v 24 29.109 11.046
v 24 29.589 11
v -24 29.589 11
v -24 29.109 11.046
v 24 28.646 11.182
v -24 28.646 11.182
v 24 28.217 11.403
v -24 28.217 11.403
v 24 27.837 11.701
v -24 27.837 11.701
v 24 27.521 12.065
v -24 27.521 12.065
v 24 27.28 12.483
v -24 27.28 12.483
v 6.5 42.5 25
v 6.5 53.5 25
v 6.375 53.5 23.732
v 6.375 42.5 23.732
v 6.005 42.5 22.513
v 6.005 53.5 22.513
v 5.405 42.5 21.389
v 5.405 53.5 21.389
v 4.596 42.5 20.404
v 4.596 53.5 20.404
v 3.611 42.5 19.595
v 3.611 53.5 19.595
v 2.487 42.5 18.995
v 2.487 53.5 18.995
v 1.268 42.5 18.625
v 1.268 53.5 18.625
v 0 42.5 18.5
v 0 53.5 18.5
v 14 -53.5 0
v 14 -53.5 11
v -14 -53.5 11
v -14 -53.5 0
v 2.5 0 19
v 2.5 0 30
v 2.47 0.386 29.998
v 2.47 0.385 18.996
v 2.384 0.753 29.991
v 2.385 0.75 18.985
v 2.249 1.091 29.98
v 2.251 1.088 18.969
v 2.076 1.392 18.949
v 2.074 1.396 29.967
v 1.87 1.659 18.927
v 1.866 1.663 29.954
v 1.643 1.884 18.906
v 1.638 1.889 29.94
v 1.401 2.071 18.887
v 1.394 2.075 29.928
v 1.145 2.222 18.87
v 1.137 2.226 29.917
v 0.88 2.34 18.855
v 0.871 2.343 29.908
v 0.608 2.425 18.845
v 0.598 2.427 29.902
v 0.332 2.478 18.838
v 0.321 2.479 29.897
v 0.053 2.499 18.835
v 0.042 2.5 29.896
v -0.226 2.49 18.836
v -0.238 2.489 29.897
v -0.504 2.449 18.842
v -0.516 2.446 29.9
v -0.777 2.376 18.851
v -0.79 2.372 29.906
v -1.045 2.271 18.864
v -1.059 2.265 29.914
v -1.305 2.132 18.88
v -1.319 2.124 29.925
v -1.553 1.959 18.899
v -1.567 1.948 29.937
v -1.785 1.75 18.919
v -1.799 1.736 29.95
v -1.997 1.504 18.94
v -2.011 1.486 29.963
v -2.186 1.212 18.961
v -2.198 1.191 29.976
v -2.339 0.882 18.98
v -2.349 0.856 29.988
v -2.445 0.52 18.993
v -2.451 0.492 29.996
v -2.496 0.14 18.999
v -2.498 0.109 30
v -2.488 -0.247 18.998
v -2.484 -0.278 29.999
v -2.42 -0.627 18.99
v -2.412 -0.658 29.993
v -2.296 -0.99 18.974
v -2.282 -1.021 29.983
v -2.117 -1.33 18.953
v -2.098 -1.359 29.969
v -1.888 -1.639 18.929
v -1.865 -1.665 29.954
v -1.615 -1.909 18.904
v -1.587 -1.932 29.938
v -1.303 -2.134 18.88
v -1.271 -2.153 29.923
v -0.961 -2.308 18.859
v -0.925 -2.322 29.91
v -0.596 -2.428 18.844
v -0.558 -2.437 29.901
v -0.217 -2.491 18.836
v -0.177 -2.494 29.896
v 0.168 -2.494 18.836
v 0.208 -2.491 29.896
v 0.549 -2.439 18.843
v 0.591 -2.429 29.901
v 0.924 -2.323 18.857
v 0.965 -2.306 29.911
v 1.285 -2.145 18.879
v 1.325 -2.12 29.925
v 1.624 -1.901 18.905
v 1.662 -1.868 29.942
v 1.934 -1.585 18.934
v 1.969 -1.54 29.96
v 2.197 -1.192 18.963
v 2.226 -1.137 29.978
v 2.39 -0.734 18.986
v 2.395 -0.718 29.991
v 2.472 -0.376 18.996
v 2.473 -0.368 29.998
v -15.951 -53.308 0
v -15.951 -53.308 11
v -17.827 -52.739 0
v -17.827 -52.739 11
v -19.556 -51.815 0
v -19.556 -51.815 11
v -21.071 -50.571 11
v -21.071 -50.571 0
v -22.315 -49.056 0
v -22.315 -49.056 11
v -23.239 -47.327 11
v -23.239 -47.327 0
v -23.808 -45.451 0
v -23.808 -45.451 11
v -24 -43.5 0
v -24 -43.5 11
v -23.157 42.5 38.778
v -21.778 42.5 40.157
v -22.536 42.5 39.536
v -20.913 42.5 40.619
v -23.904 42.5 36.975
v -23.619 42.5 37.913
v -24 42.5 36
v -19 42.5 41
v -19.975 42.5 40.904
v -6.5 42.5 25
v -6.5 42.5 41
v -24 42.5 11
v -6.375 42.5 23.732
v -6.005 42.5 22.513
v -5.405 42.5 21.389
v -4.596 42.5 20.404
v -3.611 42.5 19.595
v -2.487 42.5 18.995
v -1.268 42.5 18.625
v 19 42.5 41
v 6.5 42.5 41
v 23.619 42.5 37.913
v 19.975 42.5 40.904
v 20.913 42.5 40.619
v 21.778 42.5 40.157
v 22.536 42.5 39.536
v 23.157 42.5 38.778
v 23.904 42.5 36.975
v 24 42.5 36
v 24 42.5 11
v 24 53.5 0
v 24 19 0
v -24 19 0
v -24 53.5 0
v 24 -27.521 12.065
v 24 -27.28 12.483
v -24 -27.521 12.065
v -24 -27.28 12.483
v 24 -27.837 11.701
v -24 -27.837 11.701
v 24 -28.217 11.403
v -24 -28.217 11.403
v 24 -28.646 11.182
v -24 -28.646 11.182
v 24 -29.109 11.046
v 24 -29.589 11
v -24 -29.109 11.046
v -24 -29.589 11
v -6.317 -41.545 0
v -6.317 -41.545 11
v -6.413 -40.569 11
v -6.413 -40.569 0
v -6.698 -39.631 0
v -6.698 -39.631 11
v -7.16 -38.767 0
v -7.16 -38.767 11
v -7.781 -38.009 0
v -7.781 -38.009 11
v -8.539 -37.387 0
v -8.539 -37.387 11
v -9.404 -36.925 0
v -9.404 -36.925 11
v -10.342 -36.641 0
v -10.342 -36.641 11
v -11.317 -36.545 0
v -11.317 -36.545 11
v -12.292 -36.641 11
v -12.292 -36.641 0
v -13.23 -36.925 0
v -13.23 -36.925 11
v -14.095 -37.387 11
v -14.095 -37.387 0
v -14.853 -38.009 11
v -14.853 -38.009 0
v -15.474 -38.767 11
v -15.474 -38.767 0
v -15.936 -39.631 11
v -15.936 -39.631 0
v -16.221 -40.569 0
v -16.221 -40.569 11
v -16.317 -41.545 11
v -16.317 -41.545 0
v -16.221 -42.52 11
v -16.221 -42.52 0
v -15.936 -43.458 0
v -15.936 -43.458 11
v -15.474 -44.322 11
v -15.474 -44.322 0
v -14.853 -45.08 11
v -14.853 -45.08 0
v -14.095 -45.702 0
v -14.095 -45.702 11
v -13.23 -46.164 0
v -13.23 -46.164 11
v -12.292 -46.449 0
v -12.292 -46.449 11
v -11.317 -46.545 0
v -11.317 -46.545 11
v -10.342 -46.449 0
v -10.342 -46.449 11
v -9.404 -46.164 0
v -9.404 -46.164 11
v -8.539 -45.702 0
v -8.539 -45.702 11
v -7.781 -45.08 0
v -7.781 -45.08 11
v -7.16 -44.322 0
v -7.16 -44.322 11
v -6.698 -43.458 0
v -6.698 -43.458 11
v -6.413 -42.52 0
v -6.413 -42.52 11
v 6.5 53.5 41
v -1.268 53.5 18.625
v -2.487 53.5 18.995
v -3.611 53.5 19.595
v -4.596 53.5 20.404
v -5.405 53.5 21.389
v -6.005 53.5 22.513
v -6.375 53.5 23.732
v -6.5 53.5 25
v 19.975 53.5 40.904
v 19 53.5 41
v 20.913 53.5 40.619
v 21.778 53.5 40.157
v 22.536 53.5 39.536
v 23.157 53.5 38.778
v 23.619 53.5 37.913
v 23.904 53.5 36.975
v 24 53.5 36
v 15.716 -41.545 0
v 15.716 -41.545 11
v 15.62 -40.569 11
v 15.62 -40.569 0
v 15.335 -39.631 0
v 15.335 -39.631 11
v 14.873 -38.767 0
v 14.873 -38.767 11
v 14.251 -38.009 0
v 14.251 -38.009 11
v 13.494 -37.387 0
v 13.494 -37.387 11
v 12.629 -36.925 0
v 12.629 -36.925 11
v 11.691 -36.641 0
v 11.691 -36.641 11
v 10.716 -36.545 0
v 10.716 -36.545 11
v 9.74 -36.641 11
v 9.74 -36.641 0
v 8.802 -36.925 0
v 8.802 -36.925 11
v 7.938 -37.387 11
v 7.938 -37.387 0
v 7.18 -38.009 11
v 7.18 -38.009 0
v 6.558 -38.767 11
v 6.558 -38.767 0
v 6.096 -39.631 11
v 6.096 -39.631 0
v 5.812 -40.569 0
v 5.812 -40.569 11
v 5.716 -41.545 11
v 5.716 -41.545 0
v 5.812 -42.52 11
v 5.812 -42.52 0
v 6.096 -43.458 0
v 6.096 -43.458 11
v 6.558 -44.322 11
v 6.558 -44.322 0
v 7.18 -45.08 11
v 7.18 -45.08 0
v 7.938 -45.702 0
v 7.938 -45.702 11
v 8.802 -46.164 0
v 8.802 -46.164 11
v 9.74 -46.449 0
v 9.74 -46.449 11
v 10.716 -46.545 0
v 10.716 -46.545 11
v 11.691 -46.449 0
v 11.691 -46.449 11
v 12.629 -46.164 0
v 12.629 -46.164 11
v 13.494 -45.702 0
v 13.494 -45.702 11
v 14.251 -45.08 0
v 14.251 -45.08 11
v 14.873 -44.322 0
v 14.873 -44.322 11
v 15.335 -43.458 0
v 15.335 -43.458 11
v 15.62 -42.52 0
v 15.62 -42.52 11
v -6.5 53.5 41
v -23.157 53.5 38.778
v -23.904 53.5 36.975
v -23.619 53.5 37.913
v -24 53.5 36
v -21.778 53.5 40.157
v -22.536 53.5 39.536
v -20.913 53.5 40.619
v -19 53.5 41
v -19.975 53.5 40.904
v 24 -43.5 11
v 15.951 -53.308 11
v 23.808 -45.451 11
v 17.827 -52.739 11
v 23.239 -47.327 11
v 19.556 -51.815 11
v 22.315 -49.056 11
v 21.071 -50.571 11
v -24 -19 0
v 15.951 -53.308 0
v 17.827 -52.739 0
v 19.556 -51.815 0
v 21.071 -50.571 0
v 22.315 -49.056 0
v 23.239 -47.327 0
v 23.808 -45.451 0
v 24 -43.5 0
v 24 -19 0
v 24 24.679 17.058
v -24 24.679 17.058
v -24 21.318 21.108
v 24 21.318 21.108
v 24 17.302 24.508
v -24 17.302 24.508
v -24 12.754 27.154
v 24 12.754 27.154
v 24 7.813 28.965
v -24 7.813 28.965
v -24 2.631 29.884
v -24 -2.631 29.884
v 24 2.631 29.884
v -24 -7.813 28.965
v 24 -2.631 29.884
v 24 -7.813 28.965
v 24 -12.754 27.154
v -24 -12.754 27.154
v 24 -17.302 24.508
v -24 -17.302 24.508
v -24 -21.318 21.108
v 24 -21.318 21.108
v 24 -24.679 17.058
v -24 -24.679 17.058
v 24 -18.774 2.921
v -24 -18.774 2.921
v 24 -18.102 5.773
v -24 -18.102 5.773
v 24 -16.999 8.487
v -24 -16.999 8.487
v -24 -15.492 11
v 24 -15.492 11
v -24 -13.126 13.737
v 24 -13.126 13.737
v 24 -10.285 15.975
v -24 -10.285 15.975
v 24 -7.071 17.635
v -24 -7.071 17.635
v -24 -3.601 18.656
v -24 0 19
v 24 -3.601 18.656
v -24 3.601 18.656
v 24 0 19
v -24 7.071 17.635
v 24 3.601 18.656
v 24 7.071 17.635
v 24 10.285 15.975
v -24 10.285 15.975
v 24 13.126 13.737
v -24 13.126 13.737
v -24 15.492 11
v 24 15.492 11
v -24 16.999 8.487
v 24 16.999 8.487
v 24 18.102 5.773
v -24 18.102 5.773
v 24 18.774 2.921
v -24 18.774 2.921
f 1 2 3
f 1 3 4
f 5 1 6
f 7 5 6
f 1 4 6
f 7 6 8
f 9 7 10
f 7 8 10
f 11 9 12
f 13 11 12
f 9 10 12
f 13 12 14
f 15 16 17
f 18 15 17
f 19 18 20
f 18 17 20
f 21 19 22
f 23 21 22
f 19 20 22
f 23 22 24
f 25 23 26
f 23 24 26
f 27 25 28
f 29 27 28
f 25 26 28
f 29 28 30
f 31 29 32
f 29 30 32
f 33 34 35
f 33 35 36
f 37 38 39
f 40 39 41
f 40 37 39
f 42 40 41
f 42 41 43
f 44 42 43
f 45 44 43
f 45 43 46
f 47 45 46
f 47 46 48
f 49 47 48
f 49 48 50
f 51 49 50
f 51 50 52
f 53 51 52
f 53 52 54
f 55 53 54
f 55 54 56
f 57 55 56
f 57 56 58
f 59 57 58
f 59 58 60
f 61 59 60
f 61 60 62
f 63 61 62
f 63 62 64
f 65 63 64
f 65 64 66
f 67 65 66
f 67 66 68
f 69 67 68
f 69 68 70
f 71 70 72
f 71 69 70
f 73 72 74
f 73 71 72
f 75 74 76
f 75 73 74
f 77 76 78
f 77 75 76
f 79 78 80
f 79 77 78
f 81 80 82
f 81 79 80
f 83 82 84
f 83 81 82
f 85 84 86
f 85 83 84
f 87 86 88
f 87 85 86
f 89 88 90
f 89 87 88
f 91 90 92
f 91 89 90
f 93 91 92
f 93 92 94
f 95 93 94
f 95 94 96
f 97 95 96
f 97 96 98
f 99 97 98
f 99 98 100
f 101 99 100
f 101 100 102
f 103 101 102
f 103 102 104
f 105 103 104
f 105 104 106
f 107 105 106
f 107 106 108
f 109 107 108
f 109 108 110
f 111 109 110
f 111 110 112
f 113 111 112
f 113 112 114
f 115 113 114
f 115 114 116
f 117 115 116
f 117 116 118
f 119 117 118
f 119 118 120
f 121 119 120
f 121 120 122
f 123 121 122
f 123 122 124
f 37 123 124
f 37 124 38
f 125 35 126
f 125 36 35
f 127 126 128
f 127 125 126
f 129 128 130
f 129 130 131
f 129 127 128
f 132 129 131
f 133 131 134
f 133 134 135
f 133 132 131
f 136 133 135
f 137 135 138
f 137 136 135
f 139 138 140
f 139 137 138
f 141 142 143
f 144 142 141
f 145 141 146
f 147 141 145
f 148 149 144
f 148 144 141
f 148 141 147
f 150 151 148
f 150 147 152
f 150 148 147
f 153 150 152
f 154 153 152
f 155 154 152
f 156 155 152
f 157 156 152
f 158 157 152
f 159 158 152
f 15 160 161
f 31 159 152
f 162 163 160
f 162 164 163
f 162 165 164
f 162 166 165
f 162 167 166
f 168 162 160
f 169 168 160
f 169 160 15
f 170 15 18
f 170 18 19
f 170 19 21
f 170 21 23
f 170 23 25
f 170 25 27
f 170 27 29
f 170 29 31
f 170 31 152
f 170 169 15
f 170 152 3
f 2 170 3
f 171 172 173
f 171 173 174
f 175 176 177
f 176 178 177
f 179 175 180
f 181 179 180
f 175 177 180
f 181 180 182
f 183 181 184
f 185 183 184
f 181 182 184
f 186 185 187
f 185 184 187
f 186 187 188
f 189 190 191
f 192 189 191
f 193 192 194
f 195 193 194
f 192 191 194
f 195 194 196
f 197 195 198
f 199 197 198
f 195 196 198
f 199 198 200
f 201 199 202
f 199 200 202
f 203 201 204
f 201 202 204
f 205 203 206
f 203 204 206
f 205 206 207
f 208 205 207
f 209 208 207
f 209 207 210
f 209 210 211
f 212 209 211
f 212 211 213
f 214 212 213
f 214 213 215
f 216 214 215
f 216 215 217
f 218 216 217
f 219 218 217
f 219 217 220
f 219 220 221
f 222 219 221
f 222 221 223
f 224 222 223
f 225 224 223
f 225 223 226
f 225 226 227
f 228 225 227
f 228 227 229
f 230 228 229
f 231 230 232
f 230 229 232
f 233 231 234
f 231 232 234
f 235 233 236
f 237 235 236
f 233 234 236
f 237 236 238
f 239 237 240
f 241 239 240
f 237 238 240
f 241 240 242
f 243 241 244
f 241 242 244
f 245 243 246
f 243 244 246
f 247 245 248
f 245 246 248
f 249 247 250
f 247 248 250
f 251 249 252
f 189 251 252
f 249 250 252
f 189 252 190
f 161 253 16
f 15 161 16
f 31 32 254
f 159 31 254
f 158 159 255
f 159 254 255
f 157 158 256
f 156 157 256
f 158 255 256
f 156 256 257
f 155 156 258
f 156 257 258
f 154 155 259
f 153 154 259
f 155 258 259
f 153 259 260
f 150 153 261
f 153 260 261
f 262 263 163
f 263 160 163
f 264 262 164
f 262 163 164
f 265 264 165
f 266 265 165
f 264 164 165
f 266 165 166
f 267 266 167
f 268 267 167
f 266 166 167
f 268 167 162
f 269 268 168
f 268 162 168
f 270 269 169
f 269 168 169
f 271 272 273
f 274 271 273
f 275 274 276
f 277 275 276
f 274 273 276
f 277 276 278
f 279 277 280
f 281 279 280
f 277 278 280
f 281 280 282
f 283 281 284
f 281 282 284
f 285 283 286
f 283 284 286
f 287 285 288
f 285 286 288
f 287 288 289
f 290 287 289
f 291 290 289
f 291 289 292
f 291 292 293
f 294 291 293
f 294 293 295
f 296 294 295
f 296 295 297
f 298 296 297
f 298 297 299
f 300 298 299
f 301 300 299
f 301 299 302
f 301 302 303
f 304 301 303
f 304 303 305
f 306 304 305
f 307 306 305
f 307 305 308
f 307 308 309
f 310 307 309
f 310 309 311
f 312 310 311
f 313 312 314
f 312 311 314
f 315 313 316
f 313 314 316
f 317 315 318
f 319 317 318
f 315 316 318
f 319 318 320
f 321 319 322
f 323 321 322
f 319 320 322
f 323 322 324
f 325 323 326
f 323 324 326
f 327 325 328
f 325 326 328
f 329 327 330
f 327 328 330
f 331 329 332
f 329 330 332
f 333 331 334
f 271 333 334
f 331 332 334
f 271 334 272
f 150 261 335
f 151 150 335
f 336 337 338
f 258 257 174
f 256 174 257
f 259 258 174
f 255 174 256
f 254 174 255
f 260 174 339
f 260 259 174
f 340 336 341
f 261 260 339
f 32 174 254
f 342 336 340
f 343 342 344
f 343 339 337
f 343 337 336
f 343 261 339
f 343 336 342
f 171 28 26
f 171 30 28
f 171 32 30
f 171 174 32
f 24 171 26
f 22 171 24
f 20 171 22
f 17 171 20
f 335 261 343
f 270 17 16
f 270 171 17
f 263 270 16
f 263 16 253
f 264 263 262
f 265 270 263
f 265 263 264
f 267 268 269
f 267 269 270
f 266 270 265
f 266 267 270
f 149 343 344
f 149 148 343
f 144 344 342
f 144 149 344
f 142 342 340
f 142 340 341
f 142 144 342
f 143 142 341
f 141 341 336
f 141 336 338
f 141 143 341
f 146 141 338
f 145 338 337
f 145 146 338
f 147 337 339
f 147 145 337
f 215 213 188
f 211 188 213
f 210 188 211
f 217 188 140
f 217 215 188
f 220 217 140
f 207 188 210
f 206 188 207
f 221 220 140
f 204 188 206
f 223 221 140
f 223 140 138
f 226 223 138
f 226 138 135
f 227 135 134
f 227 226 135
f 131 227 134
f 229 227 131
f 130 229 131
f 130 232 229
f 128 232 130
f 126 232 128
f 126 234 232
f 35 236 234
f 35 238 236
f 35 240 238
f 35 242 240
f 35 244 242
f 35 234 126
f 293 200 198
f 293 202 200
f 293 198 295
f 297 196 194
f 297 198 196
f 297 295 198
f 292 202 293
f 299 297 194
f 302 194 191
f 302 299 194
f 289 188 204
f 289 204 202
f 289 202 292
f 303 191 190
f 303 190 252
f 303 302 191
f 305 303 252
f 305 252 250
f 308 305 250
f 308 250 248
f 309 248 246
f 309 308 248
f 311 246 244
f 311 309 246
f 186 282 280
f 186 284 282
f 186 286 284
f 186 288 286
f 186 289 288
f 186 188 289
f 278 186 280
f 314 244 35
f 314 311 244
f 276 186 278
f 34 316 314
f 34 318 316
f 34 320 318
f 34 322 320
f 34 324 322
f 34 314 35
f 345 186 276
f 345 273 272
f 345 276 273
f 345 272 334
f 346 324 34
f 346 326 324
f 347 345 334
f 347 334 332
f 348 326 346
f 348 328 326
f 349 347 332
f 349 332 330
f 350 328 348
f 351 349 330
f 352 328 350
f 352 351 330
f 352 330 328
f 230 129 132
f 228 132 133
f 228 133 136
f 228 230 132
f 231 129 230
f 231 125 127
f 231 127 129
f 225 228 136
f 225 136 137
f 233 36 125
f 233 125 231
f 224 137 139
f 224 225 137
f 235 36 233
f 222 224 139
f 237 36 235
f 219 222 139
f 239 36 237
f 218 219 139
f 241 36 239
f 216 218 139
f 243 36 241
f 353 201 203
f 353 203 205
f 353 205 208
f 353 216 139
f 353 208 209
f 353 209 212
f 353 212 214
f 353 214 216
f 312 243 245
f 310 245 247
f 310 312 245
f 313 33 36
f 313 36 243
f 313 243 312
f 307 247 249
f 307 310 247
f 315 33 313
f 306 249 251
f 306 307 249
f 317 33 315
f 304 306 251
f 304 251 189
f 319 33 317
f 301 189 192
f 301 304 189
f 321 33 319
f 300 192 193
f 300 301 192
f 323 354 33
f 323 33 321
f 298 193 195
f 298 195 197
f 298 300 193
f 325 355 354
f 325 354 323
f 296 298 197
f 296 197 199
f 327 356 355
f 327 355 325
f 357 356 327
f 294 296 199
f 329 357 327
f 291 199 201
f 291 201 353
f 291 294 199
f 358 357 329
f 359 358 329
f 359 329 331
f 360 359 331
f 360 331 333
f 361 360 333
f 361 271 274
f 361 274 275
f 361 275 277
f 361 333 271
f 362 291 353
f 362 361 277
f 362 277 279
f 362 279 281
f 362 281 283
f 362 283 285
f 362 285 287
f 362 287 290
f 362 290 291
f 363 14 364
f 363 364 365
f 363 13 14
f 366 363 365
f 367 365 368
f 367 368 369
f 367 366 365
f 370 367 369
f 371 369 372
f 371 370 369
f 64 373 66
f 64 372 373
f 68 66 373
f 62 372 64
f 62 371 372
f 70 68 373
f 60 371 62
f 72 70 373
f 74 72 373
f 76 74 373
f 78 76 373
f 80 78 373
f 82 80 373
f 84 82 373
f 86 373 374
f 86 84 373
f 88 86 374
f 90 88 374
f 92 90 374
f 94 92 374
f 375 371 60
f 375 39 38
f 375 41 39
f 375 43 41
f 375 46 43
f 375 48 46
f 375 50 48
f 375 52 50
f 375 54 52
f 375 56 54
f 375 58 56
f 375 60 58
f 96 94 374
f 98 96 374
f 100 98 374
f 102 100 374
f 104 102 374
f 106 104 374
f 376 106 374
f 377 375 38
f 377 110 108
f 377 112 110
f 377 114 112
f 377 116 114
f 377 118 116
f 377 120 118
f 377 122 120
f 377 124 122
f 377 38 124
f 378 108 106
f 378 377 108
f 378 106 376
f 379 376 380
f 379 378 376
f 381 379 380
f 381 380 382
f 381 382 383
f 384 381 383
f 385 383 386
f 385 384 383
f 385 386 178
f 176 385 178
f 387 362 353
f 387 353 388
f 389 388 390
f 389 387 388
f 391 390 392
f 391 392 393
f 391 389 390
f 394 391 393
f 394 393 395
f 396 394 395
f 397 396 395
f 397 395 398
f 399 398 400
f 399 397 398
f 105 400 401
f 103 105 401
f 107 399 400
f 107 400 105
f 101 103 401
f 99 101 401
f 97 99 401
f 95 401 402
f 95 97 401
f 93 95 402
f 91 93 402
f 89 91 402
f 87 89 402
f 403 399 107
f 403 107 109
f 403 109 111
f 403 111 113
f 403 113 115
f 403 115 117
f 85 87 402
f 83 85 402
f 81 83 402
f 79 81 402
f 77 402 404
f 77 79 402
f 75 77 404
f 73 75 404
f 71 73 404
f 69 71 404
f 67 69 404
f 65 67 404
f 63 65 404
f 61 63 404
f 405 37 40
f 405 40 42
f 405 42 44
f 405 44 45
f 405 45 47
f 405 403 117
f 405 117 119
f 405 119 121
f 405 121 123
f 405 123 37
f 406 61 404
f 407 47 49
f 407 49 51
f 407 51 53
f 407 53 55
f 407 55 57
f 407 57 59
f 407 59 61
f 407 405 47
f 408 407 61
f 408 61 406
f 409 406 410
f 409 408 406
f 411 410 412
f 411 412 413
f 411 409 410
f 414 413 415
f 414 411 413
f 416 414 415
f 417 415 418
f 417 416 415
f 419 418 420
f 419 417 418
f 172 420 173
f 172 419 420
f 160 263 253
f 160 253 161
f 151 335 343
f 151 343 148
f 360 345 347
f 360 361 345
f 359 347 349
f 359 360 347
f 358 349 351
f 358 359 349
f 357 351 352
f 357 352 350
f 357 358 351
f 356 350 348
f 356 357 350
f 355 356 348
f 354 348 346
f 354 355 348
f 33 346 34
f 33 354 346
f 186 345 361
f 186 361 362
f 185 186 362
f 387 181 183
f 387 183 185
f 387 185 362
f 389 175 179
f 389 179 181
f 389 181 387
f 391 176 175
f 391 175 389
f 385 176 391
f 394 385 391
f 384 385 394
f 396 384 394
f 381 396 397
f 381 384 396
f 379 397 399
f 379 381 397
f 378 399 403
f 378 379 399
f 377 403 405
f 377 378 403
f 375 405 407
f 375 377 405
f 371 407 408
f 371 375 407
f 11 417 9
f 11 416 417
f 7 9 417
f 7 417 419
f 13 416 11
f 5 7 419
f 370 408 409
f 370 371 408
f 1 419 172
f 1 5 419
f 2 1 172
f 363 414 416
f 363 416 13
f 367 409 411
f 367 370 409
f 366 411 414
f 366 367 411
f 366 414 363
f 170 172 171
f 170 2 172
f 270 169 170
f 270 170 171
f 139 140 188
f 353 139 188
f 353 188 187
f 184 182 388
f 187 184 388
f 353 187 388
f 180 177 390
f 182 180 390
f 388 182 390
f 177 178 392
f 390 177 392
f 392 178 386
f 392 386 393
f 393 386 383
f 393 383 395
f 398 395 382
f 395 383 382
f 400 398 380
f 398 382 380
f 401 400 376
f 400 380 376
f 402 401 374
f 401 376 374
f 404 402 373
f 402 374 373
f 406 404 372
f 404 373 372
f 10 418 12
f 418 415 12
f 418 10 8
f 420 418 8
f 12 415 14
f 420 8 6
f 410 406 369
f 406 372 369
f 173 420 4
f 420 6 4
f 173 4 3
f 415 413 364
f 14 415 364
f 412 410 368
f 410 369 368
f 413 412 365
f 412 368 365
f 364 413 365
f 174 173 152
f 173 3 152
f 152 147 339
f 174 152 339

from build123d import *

# Parameters (mm, degrees)
F1_DEPTH  = 24
F2_R      = 5
F3_R      = 5
F5_DEPTH  = 25.4
F7_R      = 2.54
F6_R      = 2.5
F8_DEPTH  = 25.4
F10_R     = 10
F9_R      = 5
F11_DEPTH = 25.4


with BuildPart() as f1:
    # F0 (on Right) → F1 (new body, symmetric)
    with BuildSketch(Plane.YZ):
        with BuildLine():
            ThreePointArc((-30, 0), (-29.4730143031, 5.5983415304), (-27.9105714739, 11))
            Line((-27.9105714739, 11), (-53.5, 11))
            Line((-53.5, 11), (-53.5, 0))
            Line((-53.5, 0), (-30, 0))
        make_face()
        with BuildLine():
            Line((-15.4919333848, 11), (-27.9105714739, 11))
            ThreePointArc((-27.9105714739, 11), (-29.4730143031, 5.5983415304), (-30, 0))
            Line((-30, 0), (-19, 0))
            ThreePointArc((-19, 0), (-18.1017503893, 5.7729223833), (-15.4919333848, 11))
        make_face()
        with BuildLine():
            Line((15.4919333848, 11), (27.9105714739, 11))
            ThreePointArc((27.9105714739, 11), (0, 30), (-27.9105714739, 11))
            Line((-27.9105714739, 11), (-15.4919333848, 11))
            ThreePointArc((-15.4919333848, 11), (0, 19), (15.4919333848, 11))
        make_face()
        with BuildLine():
            Line((19, 0), (30, 0))
            ThreePointArc((30, 0), (29.4730143031, 5.5983415304), (27.9105714739, 11))
            Line((27.9105714739, 11), (15.4919333848, 11))
            ThreePointArc((15.4919333848, 11), (18.1017503893, 5.7729223833), (19, 0))
        make_face()
        with BuildLine():
            Line((30, 0), (42.5, 0))
            Line((42.5, 0), (42.5, 11))
            Line((42.5, 11), (27.9105714739, 11))
            ThreePointArc((27.9105714739, 11), (29.4730143031, 5.5983415304), (30, 0))
        make_face()
        Polygon((42.5, 0), (53.5, 0), (53.5, 41), (42.5, 41), (42.5, 11), align=None)
    extrude(amount=F1_DEPTH, both=True)

    # F2
    f2_edges = [f1.edges().sort_by_distance(p)[0] for p in [
        (24, 48, 41),
    ]]
    fillet(f2_edges, radius=F2_R)

    # F3
    f3_edges = [f1.edges().sort_by_distance(p)[0] for p in [
        (-24, 48, 41),
    ]]
    fillet(f3_edges, radius=F3_R)

    # F4 (on face) → F5 (cut)
    with BuildSketch(Plane(origin=(0, 53.5, 0), x_dir=(-1, 0, 0), z_dir=(0, 1, 0))):
        with BuildLine():
            ThreePointArc((6.5, 25), (0, 31.5), (-6.5, 25))
            ThreePointArc((-6.5, 25), (-4.5961940777, 20.4038059223), (0, 18.5))
            ThreePointArc((0, 18.5), (4.5961940777, 20.4038059223), (6.5, 25))
        make_face()
        with BuildLine():
            Line((6.5, 41), (-6.5, 41))
            Line((-6.5, 41), (-6.5, 25))
            ThreePointArc((-6.5, 25), (0, 31.5), (6.5, 25))
            Line((6.5, 25), (6.5, 41))
        make_face()
    extrude(amount=-F5_DEPTH, mode=Mode.SUBTRACT)

    # F7
    f7_edges = [f1.edges().sort_by_distance(p)[0] for p in [
        (0, 27.910571, 11),
        (0, -27.910571, 11),
    ]]
    fillet(f7_edges, radius=F7_R)

    # F6 (on face) → F8 (cut)
    with BuildSketch(Plane.XY.offset(11)):
        Circle(F6_R)
    extrude(amount=F8_DEPTH, mode=Mode.SUBTRACT)

    # F10
    f10_edges = [f1.edges().sort_by_distance(p)[0] for p in [
        (-24, -53.5, 5.5),
        (24, -53.5, 5.5),
    ]]
    fillet(f10_edges, radius=F10_R)

    # F9 (on face) → F11 (cut)
    with BuildSketch(Plane.XY.offset(11)):
        with Locations((-11.3169830292, -41.5445936071)):
            Circle(F9_R)
        with Locations((10.7156652957, -41.5445936071)):
            Circle(F9_R)
    extrude(amount=-F11_DEPTH, mode=Mode.SUBTRACT)


solid = f1.part
